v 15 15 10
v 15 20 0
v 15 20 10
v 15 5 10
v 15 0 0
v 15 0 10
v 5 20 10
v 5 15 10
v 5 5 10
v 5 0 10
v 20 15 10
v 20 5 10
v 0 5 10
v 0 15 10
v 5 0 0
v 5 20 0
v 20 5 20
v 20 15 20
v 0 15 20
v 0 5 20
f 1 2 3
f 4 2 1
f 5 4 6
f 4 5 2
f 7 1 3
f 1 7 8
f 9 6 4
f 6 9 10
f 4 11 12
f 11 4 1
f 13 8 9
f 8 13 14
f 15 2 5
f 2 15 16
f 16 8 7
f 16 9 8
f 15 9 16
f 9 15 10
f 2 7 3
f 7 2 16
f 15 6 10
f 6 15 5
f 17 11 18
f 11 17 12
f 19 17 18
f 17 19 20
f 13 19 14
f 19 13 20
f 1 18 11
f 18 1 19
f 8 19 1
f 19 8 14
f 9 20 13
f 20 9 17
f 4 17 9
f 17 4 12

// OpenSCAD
module part2() {
    translate([5,0,0]) cube([10,20,10]);
    translate([0,5,10]) cube([20,10,10]);
}



module part1() {
    difference() {
        cube([20,20,21]);
        part2();
    }
}

//part1();
part2();
